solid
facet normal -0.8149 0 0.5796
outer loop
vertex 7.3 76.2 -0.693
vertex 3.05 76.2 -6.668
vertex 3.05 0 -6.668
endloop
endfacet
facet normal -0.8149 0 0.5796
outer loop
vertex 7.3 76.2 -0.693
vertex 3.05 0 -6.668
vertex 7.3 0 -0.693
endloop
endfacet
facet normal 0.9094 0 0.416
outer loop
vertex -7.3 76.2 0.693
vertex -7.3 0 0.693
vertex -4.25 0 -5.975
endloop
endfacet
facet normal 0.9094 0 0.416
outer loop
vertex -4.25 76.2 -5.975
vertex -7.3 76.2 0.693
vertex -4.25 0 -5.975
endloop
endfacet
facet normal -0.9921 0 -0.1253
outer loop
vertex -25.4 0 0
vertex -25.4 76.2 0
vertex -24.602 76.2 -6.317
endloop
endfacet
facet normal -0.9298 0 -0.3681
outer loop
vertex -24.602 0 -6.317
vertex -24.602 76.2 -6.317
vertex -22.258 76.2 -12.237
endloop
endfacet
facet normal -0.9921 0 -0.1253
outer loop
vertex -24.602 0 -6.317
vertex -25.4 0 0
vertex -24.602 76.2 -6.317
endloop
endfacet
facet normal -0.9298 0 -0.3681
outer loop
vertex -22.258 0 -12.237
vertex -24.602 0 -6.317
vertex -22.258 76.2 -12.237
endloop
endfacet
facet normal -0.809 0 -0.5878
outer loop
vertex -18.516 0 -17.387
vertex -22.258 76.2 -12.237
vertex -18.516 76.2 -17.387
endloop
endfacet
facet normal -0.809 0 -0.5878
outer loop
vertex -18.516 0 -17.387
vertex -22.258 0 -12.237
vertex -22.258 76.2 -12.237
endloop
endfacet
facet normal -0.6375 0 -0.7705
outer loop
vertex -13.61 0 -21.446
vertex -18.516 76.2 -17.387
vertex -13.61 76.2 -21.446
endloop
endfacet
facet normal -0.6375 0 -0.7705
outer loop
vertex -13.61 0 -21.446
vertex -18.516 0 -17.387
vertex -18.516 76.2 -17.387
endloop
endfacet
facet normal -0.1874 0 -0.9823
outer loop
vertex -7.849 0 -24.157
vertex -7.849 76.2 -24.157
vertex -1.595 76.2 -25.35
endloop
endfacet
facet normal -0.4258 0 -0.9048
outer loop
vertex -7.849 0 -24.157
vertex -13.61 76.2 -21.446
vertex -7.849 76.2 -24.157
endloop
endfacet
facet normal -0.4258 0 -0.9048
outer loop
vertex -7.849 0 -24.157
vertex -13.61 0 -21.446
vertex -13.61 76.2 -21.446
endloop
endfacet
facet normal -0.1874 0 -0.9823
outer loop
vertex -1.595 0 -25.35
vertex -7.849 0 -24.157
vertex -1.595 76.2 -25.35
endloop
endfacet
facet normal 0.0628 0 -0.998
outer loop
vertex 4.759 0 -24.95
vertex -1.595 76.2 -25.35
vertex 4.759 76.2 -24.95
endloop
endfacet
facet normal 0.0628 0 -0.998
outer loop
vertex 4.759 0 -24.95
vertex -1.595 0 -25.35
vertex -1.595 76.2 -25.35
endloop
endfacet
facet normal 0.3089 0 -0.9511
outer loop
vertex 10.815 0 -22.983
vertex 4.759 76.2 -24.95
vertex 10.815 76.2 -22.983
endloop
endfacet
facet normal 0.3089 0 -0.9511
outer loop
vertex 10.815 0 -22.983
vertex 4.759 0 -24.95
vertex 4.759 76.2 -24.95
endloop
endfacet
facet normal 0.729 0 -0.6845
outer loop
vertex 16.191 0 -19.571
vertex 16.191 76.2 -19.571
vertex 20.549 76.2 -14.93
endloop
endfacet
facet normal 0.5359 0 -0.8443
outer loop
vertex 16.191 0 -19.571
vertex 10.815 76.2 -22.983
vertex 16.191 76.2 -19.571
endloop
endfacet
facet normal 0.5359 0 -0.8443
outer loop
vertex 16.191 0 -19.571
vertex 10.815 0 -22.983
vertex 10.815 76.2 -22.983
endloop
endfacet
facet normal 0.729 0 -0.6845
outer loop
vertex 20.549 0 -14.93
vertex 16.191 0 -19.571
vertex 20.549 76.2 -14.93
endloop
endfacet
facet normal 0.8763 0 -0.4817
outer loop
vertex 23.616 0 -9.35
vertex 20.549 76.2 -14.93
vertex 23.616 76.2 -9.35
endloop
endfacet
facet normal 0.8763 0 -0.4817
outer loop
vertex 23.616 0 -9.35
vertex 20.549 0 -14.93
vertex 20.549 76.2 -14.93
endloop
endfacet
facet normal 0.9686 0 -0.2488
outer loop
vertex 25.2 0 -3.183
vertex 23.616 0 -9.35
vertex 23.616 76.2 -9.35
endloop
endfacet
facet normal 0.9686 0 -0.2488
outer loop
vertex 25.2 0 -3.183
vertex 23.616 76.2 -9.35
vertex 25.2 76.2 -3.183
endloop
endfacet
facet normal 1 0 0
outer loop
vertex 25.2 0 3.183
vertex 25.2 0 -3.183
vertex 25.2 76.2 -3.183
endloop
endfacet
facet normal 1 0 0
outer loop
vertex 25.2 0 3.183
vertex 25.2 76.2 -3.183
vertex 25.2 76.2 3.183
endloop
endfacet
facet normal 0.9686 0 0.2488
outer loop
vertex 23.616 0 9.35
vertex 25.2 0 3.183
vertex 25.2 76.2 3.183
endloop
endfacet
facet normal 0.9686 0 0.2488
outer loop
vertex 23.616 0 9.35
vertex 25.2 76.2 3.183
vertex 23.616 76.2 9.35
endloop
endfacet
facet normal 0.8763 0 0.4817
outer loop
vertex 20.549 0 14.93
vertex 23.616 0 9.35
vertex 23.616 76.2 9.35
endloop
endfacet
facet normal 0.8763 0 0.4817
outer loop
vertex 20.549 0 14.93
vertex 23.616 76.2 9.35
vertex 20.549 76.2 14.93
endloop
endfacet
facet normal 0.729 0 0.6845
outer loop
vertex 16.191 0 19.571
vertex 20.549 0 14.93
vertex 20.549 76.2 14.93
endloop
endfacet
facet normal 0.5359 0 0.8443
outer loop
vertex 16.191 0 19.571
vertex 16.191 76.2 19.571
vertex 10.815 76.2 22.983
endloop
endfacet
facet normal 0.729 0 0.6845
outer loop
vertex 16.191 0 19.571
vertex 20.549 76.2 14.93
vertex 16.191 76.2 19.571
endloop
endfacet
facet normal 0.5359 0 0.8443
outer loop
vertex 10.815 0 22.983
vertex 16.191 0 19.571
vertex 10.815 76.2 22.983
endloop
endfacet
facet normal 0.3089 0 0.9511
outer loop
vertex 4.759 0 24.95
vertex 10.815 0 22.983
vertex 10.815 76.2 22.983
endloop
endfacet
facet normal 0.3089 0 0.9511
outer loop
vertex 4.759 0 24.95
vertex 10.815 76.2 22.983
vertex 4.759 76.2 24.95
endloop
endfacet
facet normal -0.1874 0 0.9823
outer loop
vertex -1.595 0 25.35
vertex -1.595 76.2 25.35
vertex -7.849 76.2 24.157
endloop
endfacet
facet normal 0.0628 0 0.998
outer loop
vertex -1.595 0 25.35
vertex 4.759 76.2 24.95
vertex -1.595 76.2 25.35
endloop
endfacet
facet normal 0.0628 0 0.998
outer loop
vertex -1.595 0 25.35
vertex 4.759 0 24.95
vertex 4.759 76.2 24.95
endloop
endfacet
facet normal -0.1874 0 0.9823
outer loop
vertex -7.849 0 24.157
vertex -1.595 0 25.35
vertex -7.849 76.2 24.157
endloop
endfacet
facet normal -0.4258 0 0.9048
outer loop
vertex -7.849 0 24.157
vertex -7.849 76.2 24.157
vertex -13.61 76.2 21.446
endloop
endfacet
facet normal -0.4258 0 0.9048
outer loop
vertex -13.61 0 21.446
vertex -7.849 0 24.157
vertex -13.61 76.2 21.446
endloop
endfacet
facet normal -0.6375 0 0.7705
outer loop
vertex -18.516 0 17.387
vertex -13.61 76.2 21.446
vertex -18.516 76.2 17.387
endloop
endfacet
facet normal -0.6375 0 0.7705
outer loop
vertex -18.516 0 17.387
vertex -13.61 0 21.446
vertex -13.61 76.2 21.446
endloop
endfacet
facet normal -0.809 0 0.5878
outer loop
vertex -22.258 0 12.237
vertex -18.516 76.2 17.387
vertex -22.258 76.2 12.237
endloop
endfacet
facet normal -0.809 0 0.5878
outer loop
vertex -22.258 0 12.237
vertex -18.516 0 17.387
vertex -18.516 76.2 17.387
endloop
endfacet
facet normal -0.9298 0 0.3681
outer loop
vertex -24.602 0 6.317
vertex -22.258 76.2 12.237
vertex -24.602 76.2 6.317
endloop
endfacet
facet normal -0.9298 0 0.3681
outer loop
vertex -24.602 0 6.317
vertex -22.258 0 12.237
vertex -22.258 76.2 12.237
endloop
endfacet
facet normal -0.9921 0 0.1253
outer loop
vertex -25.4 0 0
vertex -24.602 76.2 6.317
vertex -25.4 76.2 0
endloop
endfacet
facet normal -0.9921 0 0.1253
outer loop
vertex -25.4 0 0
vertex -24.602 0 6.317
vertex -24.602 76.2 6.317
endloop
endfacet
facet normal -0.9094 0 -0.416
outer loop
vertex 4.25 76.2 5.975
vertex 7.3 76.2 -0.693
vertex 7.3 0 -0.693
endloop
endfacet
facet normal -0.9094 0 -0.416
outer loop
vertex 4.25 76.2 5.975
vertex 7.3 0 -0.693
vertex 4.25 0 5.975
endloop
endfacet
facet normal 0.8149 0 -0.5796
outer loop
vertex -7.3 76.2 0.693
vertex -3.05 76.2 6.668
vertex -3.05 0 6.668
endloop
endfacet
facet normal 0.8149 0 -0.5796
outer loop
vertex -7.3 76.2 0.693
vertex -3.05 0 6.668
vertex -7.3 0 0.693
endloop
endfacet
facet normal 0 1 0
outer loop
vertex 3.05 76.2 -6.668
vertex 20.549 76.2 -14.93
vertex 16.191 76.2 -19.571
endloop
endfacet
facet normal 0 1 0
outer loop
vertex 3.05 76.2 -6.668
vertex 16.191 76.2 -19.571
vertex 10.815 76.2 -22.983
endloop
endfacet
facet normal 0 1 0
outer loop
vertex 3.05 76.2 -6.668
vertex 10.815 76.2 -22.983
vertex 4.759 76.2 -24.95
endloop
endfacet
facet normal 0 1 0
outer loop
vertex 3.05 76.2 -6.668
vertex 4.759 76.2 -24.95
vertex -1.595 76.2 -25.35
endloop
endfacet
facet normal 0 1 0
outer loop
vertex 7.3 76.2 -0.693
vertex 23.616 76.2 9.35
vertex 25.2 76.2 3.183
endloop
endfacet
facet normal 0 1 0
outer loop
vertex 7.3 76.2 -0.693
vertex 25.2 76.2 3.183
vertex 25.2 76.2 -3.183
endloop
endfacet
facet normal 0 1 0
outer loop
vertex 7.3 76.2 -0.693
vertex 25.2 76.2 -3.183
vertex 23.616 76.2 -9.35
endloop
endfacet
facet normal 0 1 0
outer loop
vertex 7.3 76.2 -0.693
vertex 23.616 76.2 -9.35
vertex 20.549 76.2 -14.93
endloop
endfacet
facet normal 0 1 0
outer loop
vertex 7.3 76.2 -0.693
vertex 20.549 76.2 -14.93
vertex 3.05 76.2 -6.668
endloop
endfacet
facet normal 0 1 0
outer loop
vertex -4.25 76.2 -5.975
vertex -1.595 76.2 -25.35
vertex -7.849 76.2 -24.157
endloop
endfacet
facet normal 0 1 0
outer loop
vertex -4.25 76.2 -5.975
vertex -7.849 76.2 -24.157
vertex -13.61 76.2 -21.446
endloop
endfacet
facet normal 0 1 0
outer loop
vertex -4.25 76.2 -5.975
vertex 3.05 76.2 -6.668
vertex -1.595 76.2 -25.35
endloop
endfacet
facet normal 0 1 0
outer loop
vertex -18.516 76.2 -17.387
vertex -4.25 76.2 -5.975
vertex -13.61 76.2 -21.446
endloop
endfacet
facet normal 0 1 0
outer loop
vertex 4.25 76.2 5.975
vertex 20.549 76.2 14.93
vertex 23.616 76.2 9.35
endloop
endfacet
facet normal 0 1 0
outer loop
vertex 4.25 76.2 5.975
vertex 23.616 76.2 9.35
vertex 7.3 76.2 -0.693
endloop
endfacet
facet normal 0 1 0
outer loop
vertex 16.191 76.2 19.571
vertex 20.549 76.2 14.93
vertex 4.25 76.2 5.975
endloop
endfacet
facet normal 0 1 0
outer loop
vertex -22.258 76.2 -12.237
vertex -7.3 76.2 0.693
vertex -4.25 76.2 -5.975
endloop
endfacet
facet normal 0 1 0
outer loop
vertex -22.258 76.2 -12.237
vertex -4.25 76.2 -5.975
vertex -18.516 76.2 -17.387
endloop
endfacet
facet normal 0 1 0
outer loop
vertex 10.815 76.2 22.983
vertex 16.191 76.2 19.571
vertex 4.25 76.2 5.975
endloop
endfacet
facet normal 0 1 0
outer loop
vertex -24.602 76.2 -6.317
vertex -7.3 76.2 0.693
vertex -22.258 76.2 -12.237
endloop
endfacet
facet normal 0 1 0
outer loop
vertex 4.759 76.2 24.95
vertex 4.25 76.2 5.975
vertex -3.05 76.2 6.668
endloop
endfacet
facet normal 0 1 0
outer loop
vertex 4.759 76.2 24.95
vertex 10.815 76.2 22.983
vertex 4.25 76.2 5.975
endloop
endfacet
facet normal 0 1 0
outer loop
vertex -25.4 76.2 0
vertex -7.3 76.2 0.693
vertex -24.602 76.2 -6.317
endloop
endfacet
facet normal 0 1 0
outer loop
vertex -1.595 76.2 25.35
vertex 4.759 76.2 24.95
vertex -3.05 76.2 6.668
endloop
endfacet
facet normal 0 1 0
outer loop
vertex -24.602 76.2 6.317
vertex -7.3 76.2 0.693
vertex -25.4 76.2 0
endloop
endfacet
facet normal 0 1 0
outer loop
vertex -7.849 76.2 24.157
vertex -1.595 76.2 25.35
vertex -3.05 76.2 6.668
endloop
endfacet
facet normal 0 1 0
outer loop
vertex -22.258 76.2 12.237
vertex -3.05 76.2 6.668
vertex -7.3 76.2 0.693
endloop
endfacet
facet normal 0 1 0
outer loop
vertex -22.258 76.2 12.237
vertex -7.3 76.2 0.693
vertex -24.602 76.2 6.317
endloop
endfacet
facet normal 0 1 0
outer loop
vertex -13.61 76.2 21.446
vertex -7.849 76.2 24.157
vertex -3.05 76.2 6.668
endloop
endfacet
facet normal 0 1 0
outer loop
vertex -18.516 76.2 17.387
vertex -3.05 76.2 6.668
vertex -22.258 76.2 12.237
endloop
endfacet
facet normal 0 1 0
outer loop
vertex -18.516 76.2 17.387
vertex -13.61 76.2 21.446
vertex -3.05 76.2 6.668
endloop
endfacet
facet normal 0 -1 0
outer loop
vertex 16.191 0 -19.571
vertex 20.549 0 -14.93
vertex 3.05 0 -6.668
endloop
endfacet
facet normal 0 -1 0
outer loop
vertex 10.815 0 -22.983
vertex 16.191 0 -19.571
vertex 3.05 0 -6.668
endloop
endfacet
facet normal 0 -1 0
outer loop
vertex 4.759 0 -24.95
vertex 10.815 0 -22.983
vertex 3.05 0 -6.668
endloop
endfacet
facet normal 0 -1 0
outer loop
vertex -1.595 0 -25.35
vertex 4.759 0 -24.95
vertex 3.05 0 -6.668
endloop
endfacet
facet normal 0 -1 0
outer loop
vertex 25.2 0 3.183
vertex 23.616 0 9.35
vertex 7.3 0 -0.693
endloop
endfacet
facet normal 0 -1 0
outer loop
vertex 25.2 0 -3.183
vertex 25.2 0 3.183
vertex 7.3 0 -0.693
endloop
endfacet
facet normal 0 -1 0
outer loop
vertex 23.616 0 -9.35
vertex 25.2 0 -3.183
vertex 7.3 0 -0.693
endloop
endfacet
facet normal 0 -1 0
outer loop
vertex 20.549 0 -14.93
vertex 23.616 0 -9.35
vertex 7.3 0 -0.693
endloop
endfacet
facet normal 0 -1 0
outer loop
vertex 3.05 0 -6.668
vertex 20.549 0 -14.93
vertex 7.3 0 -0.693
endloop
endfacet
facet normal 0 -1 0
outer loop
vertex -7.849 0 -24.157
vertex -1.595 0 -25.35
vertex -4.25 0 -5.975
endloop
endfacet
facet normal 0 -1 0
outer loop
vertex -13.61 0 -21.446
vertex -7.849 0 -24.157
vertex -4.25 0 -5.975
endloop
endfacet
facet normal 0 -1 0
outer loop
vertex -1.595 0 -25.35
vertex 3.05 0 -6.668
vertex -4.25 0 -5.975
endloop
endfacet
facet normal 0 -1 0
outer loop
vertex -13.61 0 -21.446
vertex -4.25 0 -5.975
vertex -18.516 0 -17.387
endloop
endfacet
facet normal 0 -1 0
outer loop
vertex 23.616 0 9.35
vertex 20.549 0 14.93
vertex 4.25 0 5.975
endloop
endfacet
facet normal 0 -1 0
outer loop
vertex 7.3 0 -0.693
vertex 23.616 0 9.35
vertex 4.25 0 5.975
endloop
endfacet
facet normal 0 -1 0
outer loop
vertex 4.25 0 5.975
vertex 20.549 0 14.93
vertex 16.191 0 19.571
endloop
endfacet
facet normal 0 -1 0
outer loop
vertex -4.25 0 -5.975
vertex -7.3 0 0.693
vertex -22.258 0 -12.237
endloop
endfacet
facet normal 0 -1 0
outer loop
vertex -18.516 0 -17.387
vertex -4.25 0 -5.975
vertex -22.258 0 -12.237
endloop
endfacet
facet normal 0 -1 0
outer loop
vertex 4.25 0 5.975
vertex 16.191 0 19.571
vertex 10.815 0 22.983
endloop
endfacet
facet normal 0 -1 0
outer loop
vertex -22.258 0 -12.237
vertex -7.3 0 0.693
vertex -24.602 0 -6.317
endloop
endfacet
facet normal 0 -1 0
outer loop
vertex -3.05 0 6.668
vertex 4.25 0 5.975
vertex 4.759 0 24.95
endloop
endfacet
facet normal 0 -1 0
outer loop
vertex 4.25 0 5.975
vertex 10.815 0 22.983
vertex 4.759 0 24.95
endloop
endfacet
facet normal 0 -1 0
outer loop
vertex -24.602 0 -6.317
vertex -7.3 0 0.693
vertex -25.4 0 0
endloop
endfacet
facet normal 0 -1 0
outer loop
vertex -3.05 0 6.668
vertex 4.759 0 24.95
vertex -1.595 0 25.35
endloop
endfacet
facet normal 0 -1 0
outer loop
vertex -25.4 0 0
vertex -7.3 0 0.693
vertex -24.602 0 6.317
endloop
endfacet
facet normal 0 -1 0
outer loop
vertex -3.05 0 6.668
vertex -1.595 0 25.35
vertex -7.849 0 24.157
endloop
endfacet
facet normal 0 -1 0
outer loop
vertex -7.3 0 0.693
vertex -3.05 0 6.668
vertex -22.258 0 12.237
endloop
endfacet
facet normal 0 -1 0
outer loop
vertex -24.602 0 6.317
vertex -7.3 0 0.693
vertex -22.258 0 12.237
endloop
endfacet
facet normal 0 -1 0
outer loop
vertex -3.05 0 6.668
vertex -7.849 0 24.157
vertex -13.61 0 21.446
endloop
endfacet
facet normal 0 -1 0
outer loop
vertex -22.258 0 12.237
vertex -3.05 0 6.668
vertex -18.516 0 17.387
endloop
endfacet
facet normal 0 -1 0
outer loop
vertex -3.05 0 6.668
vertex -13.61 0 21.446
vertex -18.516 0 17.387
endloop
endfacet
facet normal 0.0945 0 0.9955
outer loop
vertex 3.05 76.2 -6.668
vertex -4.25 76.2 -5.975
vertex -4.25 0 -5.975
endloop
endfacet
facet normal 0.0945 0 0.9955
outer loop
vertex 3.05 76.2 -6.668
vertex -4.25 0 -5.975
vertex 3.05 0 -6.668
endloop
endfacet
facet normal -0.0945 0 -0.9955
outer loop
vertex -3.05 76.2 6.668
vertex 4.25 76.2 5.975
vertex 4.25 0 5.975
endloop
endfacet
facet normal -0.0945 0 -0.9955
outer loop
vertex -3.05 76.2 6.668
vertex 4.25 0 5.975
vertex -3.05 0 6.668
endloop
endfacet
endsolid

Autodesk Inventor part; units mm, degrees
ref_plane "YZ Plane" through (0, 0, 0) normal (1, 0, 0) x (0, 1, 0)
ref_plane "XZ Plane" through (0, 0, 0) normal (0, 1, 0) x (-1, 0, 0)
ref_plane "XY Plane" through (0, 0, 0) normal (0, 0, 1) x (1, 0, 0)
sketch "Sketch1" plane through (0, 0, 0) normal (0, 1, 0) x (-1, 0, 0)
  circle A0 centre (0, 0) radius 25.4
  dimension "d0" = 50.8
extrude "Extrusion1" add sketch "Sketch1" along normal blind 76.2
sketch "Sketch2" plane through (0, 76.2, 0) normal (0, 1, 0) x (1, 0, 0)
  line L0 (4.2496, -5.9753) -> (-3.0499, -6.6679)
  line L1 (-3.0499, -6.6679) -> (-7.2996, -0.6926)
  line L2 (-7.2996, -0.6926) -> (-4.2496, 5.9753)
  line L3 (-4.2496, 5.9753) -> (3.0499, 6.6679)
  line L4 (3.0499, 6.6679) -> (7.2996, 0.6926)
  line L5 (7.2996, 0.6926) -> (4.2496, -5.9753)
  point P0 (0, 0)
  point P1 (0, 0)
  dimension "d3" = 12.7
extrude "Extrusion2" cut sketch "Sketch2" against normal through all
